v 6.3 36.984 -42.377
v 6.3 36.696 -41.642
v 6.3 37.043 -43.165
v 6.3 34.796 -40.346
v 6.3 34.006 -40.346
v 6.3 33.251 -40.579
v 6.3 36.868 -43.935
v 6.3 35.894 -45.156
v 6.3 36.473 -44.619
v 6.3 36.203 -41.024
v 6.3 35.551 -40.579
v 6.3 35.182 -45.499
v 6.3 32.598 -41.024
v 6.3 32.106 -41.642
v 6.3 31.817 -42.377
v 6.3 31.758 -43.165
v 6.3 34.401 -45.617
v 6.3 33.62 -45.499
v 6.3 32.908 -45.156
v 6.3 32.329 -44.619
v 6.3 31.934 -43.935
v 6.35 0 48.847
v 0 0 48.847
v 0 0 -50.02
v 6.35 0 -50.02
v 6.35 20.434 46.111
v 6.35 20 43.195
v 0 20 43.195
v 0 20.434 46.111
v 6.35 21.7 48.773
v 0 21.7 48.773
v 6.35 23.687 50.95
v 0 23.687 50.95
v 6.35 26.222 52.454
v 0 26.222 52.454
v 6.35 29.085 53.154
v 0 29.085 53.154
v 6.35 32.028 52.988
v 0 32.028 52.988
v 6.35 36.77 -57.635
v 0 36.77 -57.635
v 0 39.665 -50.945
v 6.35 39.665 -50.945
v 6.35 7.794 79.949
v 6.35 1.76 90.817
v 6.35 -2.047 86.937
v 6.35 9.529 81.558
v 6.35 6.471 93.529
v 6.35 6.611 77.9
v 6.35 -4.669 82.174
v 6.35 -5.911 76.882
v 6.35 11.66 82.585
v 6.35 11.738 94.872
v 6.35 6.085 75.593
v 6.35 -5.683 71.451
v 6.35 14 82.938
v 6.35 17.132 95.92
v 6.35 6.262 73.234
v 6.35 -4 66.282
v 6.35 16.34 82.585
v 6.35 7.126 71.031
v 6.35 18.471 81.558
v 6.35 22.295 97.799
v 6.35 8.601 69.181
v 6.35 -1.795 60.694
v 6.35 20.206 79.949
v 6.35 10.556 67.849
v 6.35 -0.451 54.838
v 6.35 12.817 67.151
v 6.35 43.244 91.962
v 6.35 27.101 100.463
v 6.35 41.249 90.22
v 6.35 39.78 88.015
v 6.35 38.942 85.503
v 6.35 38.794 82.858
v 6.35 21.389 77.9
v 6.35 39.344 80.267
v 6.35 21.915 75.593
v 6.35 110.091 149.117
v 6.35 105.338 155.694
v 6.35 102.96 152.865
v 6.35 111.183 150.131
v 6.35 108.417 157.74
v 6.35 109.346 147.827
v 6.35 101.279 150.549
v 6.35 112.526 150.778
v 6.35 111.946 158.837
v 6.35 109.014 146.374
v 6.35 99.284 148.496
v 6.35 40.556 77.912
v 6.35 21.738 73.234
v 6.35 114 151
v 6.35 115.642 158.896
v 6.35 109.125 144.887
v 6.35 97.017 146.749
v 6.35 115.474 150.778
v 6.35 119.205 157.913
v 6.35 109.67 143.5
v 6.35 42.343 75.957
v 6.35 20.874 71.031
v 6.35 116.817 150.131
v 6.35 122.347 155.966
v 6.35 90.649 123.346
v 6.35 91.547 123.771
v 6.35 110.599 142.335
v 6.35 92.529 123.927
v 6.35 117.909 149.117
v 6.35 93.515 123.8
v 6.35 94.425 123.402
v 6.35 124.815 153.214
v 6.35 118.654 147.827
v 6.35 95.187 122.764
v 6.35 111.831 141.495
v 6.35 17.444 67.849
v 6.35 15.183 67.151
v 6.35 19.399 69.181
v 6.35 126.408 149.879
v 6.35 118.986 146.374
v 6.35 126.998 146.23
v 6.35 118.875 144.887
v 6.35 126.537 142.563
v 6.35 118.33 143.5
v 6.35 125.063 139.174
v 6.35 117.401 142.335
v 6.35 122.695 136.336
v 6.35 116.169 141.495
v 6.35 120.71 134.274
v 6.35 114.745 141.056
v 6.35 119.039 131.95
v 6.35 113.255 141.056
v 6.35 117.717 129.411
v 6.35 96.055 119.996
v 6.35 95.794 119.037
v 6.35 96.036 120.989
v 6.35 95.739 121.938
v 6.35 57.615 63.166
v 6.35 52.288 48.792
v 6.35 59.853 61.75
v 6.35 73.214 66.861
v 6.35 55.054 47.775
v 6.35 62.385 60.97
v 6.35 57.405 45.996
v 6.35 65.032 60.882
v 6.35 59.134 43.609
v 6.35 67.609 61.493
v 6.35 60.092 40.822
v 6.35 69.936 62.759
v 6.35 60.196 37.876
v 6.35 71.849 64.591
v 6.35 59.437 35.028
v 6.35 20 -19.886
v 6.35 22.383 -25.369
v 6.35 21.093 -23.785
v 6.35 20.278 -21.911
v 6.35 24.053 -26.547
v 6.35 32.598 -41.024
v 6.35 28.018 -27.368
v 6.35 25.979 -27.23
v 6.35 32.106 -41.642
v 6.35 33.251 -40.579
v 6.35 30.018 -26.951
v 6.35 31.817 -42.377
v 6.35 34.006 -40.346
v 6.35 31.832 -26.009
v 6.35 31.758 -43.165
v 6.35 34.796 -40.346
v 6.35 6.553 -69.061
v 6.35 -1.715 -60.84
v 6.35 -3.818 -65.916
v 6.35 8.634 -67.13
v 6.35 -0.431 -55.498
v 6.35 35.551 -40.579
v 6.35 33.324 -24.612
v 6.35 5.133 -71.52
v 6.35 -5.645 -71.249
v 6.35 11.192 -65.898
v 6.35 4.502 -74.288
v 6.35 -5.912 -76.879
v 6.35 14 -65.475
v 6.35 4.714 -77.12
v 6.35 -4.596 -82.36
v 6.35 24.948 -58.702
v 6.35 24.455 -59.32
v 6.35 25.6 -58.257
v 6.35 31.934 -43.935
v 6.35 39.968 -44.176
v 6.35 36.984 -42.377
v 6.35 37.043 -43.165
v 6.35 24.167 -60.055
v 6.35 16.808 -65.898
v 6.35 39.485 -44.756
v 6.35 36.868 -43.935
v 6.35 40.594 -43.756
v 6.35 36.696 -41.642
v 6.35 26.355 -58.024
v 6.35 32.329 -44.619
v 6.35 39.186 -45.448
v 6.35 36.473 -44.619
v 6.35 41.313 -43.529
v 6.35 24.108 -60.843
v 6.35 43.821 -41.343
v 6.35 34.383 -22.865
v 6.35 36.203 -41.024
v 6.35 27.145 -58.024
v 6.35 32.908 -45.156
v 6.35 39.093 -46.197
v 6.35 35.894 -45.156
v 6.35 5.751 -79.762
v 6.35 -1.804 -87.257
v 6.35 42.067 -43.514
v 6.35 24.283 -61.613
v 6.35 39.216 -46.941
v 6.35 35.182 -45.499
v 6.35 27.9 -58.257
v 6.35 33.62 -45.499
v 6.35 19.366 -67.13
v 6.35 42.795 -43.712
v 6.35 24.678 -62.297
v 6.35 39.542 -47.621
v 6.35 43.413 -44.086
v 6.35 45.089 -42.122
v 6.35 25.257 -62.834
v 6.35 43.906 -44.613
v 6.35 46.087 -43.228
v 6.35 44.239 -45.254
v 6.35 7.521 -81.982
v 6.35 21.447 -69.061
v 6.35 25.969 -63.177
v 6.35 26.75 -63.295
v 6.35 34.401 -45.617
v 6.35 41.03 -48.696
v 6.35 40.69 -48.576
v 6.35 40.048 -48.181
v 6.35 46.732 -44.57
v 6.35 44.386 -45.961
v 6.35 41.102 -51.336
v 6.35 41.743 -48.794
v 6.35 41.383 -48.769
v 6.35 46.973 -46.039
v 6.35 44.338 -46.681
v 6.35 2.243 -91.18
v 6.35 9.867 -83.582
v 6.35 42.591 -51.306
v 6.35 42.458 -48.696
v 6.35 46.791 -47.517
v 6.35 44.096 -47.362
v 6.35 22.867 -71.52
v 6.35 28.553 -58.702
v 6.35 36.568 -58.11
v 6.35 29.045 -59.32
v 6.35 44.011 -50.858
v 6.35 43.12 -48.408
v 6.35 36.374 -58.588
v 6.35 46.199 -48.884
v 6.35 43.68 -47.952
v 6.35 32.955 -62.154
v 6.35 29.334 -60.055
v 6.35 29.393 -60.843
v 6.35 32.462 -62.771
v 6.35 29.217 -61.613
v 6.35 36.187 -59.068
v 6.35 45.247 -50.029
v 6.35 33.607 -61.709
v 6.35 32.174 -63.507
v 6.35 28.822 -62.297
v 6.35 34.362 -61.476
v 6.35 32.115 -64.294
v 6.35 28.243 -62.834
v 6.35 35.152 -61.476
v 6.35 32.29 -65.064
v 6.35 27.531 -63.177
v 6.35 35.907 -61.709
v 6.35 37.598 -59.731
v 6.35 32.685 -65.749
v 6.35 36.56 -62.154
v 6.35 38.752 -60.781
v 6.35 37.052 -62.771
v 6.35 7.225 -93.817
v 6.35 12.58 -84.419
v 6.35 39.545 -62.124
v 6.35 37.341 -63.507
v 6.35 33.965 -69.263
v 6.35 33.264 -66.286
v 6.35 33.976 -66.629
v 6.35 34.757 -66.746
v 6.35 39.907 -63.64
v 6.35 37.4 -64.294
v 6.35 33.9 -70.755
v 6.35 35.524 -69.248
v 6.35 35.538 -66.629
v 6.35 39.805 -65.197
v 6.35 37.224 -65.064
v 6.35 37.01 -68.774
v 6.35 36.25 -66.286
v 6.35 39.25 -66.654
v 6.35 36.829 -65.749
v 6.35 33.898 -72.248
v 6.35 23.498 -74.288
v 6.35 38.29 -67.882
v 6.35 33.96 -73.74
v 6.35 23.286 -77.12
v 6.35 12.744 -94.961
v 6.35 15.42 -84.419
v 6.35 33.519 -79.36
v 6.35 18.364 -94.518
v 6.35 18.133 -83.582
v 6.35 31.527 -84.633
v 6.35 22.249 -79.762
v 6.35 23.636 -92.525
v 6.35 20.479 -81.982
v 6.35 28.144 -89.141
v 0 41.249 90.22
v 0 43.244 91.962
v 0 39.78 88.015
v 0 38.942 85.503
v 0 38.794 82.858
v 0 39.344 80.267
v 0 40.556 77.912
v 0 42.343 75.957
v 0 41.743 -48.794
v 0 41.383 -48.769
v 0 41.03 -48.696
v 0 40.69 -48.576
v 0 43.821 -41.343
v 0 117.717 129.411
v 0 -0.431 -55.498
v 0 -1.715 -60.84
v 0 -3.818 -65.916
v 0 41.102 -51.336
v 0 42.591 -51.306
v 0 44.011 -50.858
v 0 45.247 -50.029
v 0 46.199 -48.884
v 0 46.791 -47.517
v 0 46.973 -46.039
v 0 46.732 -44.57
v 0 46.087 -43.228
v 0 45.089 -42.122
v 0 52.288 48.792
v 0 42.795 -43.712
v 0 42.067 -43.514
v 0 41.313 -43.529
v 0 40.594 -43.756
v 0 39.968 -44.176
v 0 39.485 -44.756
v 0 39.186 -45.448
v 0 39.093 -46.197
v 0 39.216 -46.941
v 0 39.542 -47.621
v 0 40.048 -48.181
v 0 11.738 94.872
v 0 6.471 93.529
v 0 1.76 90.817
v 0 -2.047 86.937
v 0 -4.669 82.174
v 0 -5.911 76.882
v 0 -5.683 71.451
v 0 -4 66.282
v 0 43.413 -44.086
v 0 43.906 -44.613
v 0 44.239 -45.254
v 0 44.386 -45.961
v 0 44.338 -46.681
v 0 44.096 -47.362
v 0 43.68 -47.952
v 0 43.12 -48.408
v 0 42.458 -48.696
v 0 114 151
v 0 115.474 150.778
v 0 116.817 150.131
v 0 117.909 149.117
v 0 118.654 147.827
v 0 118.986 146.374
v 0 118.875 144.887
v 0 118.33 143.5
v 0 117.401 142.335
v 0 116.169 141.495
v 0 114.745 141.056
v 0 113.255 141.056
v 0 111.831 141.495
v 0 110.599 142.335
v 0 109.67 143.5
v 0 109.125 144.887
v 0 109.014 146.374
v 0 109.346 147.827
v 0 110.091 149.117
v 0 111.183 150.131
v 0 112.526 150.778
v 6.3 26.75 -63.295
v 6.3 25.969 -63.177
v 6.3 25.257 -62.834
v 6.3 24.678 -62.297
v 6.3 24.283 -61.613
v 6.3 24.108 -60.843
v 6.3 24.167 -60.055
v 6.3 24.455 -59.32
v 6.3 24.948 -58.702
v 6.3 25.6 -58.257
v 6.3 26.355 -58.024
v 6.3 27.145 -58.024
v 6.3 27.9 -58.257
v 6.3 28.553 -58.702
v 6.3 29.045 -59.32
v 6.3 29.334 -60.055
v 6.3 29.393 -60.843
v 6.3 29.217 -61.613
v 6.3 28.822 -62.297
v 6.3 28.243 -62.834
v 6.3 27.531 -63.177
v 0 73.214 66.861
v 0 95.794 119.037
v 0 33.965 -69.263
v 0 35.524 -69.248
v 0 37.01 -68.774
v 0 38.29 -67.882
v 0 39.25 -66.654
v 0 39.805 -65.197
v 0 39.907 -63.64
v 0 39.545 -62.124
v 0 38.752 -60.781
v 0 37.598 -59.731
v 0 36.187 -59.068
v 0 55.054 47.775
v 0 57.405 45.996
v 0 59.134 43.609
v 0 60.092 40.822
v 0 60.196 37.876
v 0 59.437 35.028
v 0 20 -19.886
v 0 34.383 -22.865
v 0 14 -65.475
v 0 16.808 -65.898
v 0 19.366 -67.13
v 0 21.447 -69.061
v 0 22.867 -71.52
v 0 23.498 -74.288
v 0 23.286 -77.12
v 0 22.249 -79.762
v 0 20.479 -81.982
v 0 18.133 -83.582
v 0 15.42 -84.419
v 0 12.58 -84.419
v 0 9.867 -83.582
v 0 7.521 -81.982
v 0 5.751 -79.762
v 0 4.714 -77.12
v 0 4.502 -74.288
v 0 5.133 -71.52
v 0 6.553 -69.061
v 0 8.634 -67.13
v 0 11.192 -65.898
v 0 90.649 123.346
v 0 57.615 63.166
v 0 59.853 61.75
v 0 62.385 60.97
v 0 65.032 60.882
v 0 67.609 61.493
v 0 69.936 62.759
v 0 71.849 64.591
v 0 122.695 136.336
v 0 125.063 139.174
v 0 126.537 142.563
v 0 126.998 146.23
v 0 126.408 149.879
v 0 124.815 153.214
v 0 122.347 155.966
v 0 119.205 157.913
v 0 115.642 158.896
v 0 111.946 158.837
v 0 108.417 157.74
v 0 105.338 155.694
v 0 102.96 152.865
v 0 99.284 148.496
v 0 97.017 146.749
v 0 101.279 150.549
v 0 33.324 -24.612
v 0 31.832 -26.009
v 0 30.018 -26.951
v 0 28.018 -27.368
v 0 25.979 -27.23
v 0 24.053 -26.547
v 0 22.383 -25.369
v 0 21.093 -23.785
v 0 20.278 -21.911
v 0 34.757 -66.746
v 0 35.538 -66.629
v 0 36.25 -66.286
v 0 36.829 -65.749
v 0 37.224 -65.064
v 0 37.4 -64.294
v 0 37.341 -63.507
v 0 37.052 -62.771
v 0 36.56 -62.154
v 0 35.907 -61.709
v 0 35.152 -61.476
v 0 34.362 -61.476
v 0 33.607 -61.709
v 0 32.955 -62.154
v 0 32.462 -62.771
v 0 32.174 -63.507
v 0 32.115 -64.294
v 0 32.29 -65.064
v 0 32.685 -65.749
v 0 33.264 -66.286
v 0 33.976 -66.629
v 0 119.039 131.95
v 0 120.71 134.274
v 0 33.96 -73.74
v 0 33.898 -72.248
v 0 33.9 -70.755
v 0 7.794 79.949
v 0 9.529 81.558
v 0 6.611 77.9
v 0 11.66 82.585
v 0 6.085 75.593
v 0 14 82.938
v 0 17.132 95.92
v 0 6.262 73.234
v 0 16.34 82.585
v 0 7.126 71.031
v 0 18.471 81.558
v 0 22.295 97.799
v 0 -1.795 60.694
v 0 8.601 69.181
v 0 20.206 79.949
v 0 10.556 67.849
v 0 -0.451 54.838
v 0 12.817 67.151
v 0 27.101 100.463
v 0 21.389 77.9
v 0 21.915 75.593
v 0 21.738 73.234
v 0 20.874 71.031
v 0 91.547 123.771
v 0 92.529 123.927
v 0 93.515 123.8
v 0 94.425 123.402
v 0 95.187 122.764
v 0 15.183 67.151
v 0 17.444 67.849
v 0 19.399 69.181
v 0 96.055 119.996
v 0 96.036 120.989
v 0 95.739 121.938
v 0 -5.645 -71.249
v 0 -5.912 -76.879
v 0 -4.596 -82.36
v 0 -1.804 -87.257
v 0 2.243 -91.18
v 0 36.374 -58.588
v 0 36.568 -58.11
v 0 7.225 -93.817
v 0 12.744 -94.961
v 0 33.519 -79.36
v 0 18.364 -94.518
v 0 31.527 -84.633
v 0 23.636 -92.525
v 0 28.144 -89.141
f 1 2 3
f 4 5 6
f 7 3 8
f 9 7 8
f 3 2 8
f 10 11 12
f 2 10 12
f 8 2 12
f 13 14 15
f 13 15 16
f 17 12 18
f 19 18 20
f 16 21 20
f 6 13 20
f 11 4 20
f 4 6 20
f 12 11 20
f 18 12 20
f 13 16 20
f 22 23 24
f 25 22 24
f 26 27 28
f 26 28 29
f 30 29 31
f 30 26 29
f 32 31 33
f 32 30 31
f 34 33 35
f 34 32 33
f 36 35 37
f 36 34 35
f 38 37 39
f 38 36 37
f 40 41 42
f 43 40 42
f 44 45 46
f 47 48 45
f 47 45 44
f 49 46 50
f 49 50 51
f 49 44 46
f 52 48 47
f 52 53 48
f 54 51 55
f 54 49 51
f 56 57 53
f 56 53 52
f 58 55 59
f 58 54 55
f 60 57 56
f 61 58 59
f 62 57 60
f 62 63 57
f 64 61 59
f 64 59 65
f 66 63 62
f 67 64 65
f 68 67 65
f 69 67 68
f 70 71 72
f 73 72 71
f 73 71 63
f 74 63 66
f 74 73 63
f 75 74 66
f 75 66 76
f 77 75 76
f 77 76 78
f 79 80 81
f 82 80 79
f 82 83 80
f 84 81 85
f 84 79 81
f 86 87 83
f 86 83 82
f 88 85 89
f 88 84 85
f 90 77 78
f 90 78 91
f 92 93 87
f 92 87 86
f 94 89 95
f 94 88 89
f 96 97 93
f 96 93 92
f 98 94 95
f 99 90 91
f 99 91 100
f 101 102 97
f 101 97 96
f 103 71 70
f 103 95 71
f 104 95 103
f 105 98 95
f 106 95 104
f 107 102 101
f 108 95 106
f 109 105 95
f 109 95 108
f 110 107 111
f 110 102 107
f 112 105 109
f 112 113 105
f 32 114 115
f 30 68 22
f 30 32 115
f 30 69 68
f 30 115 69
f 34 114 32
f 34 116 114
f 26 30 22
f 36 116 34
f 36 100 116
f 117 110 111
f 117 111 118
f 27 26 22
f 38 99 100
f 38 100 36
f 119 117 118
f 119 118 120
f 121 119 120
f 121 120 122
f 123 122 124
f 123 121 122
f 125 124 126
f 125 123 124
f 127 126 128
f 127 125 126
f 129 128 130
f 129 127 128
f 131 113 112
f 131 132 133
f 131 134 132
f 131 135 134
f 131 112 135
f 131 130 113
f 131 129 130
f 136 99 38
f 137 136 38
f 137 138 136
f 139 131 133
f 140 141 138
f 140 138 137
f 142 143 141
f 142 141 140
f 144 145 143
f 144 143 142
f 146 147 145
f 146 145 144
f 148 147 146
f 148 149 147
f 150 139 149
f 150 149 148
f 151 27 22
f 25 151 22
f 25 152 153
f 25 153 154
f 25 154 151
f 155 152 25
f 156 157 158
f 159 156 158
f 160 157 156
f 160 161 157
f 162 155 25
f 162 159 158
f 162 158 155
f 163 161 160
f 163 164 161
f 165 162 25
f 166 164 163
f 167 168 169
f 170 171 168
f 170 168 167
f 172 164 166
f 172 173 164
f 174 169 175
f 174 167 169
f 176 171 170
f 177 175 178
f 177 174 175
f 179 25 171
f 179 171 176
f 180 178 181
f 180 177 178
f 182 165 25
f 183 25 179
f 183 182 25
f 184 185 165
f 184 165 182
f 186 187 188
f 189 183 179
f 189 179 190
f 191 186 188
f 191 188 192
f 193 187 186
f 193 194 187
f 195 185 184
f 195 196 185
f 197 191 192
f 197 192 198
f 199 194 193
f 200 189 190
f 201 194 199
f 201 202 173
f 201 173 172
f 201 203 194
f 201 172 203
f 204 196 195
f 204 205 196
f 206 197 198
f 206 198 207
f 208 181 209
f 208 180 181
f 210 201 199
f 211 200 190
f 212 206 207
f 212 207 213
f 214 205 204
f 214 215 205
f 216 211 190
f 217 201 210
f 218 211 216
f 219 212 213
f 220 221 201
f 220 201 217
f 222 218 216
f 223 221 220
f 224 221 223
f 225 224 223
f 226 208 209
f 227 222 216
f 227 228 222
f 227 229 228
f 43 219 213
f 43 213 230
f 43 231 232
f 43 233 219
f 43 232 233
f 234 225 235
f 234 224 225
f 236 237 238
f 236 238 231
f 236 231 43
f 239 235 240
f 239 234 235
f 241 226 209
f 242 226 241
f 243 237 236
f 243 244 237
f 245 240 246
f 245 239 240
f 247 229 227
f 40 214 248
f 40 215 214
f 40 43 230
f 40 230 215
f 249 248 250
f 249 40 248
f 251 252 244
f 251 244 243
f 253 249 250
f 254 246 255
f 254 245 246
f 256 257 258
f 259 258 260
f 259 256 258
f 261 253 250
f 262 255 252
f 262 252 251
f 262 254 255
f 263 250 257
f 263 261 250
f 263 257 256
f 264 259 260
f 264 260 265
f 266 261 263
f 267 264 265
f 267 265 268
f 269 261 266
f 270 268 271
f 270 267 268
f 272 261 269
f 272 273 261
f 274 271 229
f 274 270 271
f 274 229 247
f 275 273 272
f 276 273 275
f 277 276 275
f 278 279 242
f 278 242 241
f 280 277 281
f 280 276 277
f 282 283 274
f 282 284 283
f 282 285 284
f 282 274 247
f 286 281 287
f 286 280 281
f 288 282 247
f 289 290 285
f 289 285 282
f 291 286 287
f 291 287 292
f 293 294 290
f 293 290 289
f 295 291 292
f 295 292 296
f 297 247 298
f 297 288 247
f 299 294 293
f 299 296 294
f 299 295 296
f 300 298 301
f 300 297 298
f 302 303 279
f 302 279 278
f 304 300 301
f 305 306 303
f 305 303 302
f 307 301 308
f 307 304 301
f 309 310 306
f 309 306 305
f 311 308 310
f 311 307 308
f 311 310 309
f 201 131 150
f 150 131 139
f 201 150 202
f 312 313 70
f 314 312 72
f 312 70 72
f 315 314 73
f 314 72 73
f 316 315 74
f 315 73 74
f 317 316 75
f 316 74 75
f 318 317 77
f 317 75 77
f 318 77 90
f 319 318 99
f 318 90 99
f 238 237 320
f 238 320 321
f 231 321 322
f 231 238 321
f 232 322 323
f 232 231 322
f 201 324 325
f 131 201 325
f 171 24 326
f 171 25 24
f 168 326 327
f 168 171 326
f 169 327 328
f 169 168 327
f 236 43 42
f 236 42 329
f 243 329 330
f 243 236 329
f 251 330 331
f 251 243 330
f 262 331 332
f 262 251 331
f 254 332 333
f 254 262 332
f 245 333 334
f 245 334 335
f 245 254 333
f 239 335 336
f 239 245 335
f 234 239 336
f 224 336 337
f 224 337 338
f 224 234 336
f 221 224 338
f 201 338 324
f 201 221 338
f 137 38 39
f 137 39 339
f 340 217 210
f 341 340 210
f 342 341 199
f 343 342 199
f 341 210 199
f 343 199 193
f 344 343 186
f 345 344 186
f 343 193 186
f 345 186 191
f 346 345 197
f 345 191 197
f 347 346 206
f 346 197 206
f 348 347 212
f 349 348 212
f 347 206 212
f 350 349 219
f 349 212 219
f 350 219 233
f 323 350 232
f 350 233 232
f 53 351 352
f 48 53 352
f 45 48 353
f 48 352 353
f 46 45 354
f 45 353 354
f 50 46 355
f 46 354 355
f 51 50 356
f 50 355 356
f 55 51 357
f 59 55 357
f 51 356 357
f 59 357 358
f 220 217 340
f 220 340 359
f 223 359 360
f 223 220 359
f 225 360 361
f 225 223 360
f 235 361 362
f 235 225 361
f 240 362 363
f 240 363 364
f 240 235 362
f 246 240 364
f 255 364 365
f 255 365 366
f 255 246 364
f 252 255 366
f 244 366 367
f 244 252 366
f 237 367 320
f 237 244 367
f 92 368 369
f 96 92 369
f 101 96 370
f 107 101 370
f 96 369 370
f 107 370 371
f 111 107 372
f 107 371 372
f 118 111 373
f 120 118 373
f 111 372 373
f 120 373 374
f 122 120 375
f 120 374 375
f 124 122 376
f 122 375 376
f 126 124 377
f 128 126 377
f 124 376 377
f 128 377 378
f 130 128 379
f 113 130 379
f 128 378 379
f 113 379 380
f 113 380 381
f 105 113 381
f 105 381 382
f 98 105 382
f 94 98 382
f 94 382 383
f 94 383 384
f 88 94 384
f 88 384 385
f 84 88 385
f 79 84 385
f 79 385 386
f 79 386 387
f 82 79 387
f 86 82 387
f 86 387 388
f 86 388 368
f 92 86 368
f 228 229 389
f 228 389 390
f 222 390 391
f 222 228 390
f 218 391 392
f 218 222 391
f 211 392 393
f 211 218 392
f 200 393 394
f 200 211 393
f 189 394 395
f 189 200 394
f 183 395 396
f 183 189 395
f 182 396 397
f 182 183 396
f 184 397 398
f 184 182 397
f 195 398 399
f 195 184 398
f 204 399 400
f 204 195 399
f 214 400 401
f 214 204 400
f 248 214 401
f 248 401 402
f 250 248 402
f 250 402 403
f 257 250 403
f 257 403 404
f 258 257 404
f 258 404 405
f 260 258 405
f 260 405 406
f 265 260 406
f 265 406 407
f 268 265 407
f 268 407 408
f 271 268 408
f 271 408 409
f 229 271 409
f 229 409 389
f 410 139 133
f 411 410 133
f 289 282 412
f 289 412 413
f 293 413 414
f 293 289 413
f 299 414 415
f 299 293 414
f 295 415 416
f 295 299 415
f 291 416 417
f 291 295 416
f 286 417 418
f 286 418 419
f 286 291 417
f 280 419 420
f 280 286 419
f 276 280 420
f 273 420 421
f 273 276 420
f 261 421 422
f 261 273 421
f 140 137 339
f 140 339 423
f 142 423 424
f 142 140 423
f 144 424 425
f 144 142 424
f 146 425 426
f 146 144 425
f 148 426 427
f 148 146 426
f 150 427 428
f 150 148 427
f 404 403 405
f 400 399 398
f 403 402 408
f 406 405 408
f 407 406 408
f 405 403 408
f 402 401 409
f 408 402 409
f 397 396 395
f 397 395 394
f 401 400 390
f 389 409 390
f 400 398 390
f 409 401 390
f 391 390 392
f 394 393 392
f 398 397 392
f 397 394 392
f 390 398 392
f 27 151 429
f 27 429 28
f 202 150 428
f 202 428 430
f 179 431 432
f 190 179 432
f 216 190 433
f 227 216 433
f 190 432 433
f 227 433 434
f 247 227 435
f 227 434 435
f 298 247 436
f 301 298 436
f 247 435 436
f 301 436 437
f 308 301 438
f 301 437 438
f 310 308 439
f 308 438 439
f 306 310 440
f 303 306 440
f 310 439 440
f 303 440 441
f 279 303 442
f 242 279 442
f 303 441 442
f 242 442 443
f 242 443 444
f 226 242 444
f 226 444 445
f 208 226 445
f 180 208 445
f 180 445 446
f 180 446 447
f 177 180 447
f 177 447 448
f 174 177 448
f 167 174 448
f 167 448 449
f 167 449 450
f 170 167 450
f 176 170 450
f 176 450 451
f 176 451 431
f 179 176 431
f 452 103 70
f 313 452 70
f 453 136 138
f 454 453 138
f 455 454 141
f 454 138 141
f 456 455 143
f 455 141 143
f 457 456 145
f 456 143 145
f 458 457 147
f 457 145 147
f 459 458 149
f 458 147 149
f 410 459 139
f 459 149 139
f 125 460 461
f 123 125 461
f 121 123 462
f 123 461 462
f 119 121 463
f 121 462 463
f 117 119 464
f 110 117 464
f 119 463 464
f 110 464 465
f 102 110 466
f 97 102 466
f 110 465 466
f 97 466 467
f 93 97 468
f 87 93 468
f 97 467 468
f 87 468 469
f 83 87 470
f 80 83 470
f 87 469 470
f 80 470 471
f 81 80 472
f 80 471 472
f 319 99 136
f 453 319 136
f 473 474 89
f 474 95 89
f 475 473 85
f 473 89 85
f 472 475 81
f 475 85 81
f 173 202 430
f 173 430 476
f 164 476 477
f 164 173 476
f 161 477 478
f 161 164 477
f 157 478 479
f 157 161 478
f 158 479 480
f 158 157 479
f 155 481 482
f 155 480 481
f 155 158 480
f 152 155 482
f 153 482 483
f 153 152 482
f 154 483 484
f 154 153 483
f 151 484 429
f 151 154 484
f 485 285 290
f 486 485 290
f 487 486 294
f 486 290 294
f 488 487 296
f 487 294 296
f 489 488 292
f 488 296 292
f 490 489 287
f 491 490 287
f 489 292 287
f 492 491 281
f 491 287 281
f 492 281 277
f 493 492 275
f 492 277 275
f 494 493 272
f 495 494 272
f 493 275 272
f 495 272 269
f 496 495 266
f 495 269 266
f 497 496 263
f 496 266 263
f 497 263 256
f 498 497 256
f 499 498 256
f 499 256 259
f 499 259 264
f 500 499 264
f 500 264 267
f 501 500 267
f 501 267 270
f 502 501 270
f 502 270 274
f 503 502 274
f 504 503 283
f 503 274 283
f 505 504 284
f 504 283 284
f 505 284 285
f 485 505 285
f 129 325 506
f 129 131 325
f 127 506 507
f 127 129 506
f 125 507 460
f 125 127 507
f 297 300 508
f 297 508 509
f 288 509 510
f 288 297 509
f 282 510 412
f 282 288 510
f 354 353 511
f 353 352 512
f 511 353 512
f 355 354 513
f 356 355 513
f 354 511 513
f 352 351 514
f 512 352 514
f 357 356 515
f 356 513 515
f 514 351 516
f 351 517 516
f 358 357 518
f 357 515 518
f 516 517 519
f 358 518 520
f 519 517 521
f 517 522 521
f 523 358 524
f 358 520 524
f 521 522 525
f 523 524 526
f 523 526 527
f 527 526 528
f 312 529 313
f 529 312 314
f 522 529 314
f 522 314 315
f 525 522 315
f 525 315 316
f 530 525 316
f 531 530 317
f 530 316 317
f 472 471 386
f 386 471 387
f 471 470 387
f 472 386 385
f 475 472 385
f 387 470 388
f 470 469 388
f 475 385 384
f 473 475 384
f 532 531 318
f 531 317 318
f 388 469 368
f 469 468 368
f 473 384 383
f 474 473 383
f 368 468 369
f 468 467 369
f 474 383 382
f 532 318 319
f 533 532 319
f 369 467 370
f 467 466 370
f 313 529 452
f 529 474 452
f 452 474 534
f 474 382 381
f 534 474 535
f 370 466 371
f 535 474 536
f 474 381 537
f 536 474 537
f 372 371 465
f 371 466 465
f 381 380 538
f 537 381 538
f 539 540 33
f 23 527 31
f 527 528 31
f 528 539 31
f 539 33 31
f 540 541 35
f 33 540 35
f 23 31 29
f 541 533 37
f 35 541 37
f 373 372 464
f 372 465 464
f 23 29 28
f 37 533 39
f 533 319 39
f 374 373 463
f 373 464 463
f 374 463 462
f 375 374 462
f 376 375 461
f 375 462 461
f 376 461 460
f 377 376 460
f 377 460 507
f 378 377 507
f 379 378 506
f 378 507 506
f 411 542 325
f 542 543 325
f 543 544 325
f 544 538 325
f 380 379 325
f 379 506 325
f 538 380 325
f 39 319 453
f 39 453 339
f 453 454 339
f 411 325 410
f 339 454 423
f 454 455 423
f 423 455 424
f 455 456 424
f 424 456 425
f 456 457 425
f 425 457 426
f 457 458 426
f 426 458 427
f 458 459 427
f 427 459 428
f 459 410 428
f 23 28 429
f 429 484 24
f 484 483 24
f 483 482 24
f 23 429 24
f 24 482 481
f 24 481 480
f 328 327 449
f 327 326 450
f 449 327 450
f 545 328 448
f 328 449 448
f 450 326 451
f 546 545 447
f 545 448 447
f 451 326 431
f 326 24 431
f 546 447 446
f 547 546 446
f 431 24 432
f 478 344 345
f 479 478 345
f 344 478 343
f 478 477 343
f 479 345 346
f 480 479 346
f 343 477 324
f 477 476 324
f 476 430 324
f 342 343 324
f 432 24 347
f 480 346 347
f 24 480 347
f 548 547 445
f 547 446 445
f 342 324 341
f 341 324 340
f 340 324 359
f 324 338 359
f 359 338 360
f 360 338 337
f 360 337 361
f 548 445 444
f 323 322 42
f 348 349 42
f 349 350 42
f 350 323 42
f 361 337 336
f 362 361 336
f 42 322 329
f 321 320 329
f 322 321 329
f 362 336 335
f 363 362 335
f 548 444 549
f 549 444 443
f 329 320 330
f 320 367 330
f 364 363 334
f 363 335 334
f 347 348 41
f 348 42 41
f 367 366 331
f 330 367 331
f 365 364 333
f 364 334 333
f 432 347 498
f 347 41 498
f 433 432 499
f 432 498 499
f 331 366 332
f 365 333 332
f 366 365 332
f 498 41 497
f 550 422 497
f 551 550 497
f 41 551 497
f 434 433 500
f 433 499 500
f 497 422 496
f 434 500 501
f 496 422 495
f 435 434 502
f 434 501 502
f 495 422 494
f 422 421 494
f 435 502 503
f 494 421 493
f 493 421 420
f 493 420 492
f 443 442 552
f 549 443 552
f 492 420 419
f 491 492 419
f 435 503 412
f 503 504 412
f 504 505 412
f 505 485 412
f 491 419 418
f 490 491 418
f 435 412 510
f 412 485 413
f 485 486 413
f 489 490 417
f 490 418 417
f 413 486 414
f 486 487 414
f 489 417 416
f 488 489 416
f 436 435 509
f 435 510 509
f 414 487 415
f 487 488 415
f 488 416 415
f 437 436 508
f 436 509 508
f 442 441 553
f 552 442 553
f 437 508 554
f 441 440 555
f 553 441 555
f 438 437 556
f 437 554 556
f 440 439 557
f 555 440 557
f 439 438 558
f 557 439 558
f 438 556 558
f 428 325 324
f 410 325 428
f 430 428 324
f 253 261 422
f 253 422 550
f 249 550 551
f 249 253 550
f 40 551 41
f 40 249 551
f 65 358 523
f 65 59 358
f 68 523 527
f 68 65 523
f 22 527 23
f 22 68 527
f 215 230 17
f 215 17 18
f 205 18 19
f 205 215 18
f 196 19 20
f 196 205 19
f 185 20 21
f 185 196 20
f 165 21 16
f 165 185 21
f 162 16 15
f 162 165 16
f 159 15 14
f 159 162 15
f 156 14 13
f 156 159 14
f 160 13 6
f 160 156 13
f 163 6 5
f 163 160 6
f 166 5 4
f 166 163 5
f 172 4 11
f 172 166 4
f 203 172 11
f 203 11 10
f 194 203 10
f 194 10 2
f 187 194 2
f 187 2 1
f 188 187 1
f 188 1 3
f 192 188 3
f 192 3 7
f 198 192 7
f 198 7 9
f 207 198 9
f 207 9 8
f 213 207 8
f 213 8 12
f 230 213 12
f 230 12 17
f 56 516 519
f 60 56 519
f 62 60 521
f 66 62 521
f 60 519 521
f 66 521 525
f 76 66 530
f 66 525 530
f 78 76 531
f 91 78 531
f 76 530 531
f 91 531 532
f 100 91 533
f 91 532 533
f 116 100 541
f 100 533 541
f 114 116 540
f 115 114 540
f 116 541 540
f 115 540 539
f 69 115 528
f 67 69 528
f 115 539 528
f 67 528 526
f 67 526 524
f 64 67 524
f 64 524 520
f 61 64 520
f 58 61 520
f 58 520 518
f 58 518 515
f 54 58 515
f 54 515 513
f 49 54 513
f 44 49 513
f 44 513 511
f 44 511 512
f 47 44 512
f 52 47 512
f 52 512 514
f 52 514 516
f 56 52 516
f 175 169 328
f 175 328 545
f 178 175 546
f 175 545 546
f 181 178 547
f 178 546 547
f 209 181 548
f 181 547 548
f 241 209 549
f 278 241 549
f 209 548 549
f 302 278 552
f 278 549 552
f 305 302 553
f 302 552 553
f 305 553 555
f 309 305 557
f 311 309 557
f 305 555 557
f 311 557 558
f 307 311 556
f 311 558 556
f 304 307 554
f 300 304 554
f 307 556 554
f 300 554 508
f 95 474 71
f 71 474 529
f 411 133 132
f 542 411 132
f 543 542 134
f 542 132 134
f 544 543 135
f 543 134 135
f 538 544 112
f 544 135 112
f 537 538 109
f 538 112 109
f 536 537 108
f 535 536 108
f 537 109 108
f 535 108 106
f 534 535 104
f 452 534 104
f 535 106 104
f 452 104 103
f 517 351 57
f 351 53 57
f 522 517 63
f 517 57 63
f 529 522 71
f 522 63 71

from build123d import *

# Parameters (mm, degrees)
BOSS_EXTRUDE1_DEPTH         = 6.35
F_3_4_0_75_DIAMETER_HOLE1_D = 19.05
F_10_0_10_DIAMETER_HOLE1_D  = 10
F_5_8_DIAMETER_HOLE2_D      = 15.875
CUT_EXTRUDE1_REACH          = 205.594
FILLET1_R                   = 35
FILLET3_R                   = 35
FILLET4_R                   = 20
FILLET6_R                   = 40
SKETCH22_R                  = 2.65
CUT_EXTRUDE2_DEPTH          = 10
SKETCH24_R                  = 2.65
CUT_EXTRUDE3_DEPTH          = 10
BOSS_EXTRUDE4_DEPTH         = 6.35
BOSS_EXTRUDE5_DEPTH         = 6.35
SKETCH30_R                  = 2.65
CUT_EXTRUDE4_DEPTH          = 6.35
SKETCH31_R                  = 2.131200652
CUT_EXTRUDE5_DEPTH          = 6.35
SKETCH32_R                  = 2.65
CUT_EXTRUDE6_DEPTH          = 6.35
SKETCH33_R                  = 2.65
SKETCH33_R_2                = 3.724628158
BOSS_EXTRUDE6_DEPTH         = 6.3
CUT_EXTRUDE7_START          = -10
SKETCH34_R                  = 2.65
CUT_EXTRUDE7_DEPTH          = 10
BOSS_EXTRUDE7_START         = -6.3
SKETCH35_R                  = 2.65
BOSS_EXTRUDE7_DEPTH         = 6.3


with BuildPart() as part:
    # Sketch1 → Boss-Extrude1 (new body)
    with BuildSketch(Plane(origin=(0, 0, 0), x_dir=(0, 0, -1), z_dir=(1, 0, 0))):
        with BuildLine():
            Line((-60.717143143, 0), (60.717143143, 0))
            ThreePointArc((60.717143143, 0), (94.584407895, 9.944020783), (67.452353804, 32.521151068))
            Line((67.452353804, 32.521151068), (-134.404938559, 119.878311848))
            ThreePointArc((-134.404938559, 119.878311848), (-155.966181949, 122.347168224), (-149.752887031, 101.553480851))
            Line((-149.752887031, 101.553480851), (-94.55805454, 18.181208272))
            ThreePointArc((-94.55805454, 18.181208272), (-84.465516954, -3.618285637), (-60.717143143, 0))
        make_face()
    extrude(amount=BOSS_EXTRUDE1_DEPTH)

    # 3/4 (0.75) Diameter Hole1 (through all)
    with Locations(Plane(origin=(6.35, 0, 0), x_dir=(0, 0, -1), z_dir=(1, 0, 0))):
        with Locations((75, 14)):
            Hole(F_3_4_0_75_DIAMETER_HOLE1_D / 2)

    # Ø10.0 (10) Diameter Hole1 (through all)
    with Locations(Plane(origin=(6.35, 0, 0), x_dir=(0, 0, -1), z_dir=(1, 0, 0))):
        with Locations((-146, 114)):
            Hole(F_10_0_10_DIAMETER_HOLE1_D / 2)

    # Ø5/8" Diameter Hole2 (through all)
    with Locations(Plane(origin=(6.35, 0, 0), x_dir=(0, 0, -1), z_dir=(1, 0, 0))):
        with Locations((-75, 14)):
            Hole(F_5_8_DIAMETER_HOLE2_D / 2)

    # Sketch8 → Cut-Extrude1 (cut, up to next)
    with BuildSketch(Plane(origin=(6.35, 0, 0), x_dir=(0, 0, -1), z_dir=(1, 0, 0)), mode=Mode.PRIVATE) as cut_extrude1_sk1:
        with BuildLine():
            Line((-52.98768213, 32.027989609), (-48.791838571, 52.287736349))
            ThreePointArc((-48.791838571, 52.287736349), (-43.609219792, 59.133963583), (-35.027937054, 59.43719837))
            Line((-35.027937054, 59.43719837), (22.864909862, 34.383088722))
            ThreePointArc((22.864909862, 34.383088722), (27.230289645, 25.979007794), (19.886136685, 20))
            Line((19.886136685, 20), (-43.195478183, 20))
            ThreePointArc((-43.195478183, 20), (-50.950473221, 23.686518238), (-52.98768213, 32.027989609))
        make_face()
    cut_extrude1_tool1 = extrude(cut_extrude1_sk1.sketch, amount=-CUT_EXTRUDE1_REACH, mode=Mode.PRIVATE) & part.part
    # Sketch8 → Cut-Extrude1 (cut, up to next)
    with BuildSketch(Plane(origin=(6.35, 0, 0), x_dir=(0, 0, -1), z_dir=(1, 0, 0)), mode=Mode.PRIVATE) as cut_extrude1_sk2:
        with BuildLine():
            Line((-75.95726339, 42.34340423), (-63.166421785, 57.61515284))
            ThreePointArc((-63.166421785, 57.61515284), (-61.101947711, 66.340863059), (-66.861018022, 73.213503103))
            Line((-66.861018022, 73.213503103), (-119.037006728, 95.793545572))
            ThreePointArc((-119.037006728, 95.793545572), (-123.11030371, 94.828752024), (-123.345509052, 90.649367698))
            Line((-123.345509052, 90.649367698), (-91.961866267, 43.244103424))
            ThreePointArc((-91.961866267, 43.244103424), (-84.185443207, 38.780101137), (-75.95726339, 42.34340423))
        make_face()
    cut_extrude1_tool2 = extrude(cut_extrude1_sk2.sketch, amount=-CUT_EXTRUDE1_REACH, mode=Mode.PRIVATE) & part.part
    add(cut_extrude1_tool1.solids().sort_by_distance((6.35, 35.497015, 18.727672))[0], mode=Mode.SUBTRACT)
    add(cut_extrude1_tool2.solids().sort_by_distance((6.35, 67.079595, 89.97893))[0], mode=Mode.SUBTRACT)

    # Fillet1
    fillet1_edges = [part.edges().sort_by_distance(p)[0] for p in [
        (3.175, 18.181208272, 94.55805454),
    ]]
    fillet(fillet1_edges, radius=FILLET1_R)

    # Fillet3
    fillet3_edges = [part.edges().sort_by_distance(p)[0] for p in [
        (3.175, 32.521151068, -67.452353804),
        (3.175, 0, -60.717143143),
    ]]
    fillet(fillet3_edges, radius=FILLET3_R)

    # Fillet4
    fillet4_edges = [part.edges().sort_by_distance(p)[0] for p in [
        (3.175, 101.553480851, 149.752887031),
        (3.175, 119.878311848, 134.404938559),
    ]]
    fillet(fillet4_edges, radius=FILLET4_R)

    # Fillet6
    fillet6_edges = [part.edges().sort_by_distance(p)[0] for p in [
        (3.175, 0, 60.717143143),
    ]]
    fillet(fillet6_edges, radius=FILLET6_R)

    # Sketch22 → Cut-Extrude2 (cut)
    with BuildSketch(Plane(origin=(6.35, 0, 0), x_dir=(0, 0, -1), z_dir=(1, 0, 0))):
        with Locations((60.644779113, 26.750227475)):
            Circle(SKETCH22_R)
    extrude(amount=-CUT_EXTRUDE2_DEPTH, mode=Mode.SUBTRACT)

    # Sketch24 → Cut-Extrude3 (cut)
    with BuildSketch(Plane(origin=(6.35, 0, 0), x_dir=(0, 0, -1), z_dir=(1, 0, 0))):
        with Locations((42.966527297, 34.400790246)):
            Circle(SKETCH24_R)
    extrude(amount=-CUT_EXTRUDE3_DEPTH, mode=Mode.SUBTRACT)

    # Sketch25 → Boss-Extrude4 (add)
    with BuildSketch(Plane(origin=(6.35, 0, 0), x_dir=(0, 0, -1), z_dir=(1, 0, 0))):
        with BuildLine():
            ThreePointArc((43.711860671, 42.795251406), (46.681302599, 44.337685596), (48.793885353, 41.74275155))
            ThreePointArc((48.793885353, 41.74275155), (48.738819399, 41.205334304), (48.575910035, 40.690251694))
            Line((48.575910035, 40.690251694), (50.945207618, 39.664898052))
            ThreePointArc((50.945207618, 39.664898052), (48.221738851, 46.544073815), (41.342563089, 43.820605048))
            Line((41.342563089, 43.820605048), (43.711860671, 42.795251406))
        make_face()
    extrude(amount=-BOSS_EXTRUDE4_DEPTH)

    # Sketch29 → Boss-Extrude5 (add)
    with BuildSketch(Plane(origin=(6.35, 0, 0), x_dir=(0, 0, -1), z_dir=(1, 0, 0))):
        with BuildLine():
            ThreePointArc((69.263055818, 33.964695583), (65.196576348, 39.805321361), (59.068365536, 36.186730888))
            ThreePointArc((59.068365536, 36.186730888), (60.5303447, 35.66620465), (62.013960909, 35.210997462))
            ThreePointArc((62.013960909, 35.210997462), (64.343055459, 36.809883075), (66.21463271, 34.693680056))
            ThreePointArc((66.21463271, 34.693680056), (66.205602012, 34.497647468), (66.178586414, 34.303275437))
            ThreePointArc((66.178586414, 34.303275437), (67.717067085, 34.099786208), (69.263055818, 33.964695583))
        make_face()
    extrude(amount=-BOSS_EXTRUDE5_DEPTH)

    # Sketch30 → Cut-Extrude4 (cut)
    with BuildSketch(Plane(origin=(6.35, 0, 0), x_dir=(0, 0, -1), z_dir=(1, 0, 0))):
        with Locations((46.143885353, 41.74275155)):
            Circle(SKETCH30_R)
    extrude(amount=-CUT_EXTRUDE4_DEPTH, mode=Mode.SUBTRACT)

    # Sketch31 → Cut-Extrude5 (cut)
    with BuildSketch(Plane(origin=(6.35, 0, 0), x_dir=(0, 0, -1), z_dir=(1, 0, 0))):
        with Locations((64.096273662, 34.757136449)):
            Circle(SKETCH31_R)
    extrude(amount=-CUT_EXTRUDE5_DEPTH, mode=Mode.SUBTRACT)

    # Sketch32 → Cut-Extrude6 (cut)
    with BuildSketch(Plane(origin=(6.35, 0, 0), x_dir=(0, 0, -1), z_dir=(1, 0, 0))):
        with Locations((64.096273662, 34.757136449)):
            Circle(SKETCH32_R)
    extrude(amount=-CUT_EXTRUDE6_DEPTH, mode=Mode.SUBTRACT)

    # Sketch33 → Boss-Extrude6 (add)
    with BuildSketch(Plane(origin=(6.35, 0, 0), x_dir=(0, 0, -1), z_dir=(1, 0, 0))):
        with Locations((42.966527297, 34.400790246)):
            Circle(SKETCH33_R)
        with Locations((60.715336282, 26.683263033)):
            Circle(SKETCH33_R_2)
    extrude(amount=-BOSS_EXTRUDE6_DEPTH)

    # Sketch34 → Cut-Extrude7 (cut)
    with BuildSketch(Plane.ZY.offset(CUT_EXTRUDE7_START)):
        with Locations(Location((-60.644779113, 26.750227475, 0), (0, 0, 180))):
            Circle(SKETCH34_R)
        with Locations(Location((-42.966527297, 34.400790246, 0), (0, 0, 180))):
            Circle(SKETCH34_R)
    extrude(amount=CUT_EXTRUDE7_DEPTH, mode=Mode.SUBTRACT)

    # Sketch35 → Boss-Extrude7 (add)
    with BuildSketch(Plane.ZY.offset(BOSS_EXTRUDE7_START)):
        with Locations(Location((-60.644779113, 26.750227475, 0), (0, 0, 180))):
            Circle(SKETCH35_R)
        with Locations(Location((-42.966527297, 34.400790246, 0), (0, 0, 180))):
            Circle(SKETCH35_R)
    extrude(amount=BOSS_EXTRUDE7_DEPTH)


solid = part.part
